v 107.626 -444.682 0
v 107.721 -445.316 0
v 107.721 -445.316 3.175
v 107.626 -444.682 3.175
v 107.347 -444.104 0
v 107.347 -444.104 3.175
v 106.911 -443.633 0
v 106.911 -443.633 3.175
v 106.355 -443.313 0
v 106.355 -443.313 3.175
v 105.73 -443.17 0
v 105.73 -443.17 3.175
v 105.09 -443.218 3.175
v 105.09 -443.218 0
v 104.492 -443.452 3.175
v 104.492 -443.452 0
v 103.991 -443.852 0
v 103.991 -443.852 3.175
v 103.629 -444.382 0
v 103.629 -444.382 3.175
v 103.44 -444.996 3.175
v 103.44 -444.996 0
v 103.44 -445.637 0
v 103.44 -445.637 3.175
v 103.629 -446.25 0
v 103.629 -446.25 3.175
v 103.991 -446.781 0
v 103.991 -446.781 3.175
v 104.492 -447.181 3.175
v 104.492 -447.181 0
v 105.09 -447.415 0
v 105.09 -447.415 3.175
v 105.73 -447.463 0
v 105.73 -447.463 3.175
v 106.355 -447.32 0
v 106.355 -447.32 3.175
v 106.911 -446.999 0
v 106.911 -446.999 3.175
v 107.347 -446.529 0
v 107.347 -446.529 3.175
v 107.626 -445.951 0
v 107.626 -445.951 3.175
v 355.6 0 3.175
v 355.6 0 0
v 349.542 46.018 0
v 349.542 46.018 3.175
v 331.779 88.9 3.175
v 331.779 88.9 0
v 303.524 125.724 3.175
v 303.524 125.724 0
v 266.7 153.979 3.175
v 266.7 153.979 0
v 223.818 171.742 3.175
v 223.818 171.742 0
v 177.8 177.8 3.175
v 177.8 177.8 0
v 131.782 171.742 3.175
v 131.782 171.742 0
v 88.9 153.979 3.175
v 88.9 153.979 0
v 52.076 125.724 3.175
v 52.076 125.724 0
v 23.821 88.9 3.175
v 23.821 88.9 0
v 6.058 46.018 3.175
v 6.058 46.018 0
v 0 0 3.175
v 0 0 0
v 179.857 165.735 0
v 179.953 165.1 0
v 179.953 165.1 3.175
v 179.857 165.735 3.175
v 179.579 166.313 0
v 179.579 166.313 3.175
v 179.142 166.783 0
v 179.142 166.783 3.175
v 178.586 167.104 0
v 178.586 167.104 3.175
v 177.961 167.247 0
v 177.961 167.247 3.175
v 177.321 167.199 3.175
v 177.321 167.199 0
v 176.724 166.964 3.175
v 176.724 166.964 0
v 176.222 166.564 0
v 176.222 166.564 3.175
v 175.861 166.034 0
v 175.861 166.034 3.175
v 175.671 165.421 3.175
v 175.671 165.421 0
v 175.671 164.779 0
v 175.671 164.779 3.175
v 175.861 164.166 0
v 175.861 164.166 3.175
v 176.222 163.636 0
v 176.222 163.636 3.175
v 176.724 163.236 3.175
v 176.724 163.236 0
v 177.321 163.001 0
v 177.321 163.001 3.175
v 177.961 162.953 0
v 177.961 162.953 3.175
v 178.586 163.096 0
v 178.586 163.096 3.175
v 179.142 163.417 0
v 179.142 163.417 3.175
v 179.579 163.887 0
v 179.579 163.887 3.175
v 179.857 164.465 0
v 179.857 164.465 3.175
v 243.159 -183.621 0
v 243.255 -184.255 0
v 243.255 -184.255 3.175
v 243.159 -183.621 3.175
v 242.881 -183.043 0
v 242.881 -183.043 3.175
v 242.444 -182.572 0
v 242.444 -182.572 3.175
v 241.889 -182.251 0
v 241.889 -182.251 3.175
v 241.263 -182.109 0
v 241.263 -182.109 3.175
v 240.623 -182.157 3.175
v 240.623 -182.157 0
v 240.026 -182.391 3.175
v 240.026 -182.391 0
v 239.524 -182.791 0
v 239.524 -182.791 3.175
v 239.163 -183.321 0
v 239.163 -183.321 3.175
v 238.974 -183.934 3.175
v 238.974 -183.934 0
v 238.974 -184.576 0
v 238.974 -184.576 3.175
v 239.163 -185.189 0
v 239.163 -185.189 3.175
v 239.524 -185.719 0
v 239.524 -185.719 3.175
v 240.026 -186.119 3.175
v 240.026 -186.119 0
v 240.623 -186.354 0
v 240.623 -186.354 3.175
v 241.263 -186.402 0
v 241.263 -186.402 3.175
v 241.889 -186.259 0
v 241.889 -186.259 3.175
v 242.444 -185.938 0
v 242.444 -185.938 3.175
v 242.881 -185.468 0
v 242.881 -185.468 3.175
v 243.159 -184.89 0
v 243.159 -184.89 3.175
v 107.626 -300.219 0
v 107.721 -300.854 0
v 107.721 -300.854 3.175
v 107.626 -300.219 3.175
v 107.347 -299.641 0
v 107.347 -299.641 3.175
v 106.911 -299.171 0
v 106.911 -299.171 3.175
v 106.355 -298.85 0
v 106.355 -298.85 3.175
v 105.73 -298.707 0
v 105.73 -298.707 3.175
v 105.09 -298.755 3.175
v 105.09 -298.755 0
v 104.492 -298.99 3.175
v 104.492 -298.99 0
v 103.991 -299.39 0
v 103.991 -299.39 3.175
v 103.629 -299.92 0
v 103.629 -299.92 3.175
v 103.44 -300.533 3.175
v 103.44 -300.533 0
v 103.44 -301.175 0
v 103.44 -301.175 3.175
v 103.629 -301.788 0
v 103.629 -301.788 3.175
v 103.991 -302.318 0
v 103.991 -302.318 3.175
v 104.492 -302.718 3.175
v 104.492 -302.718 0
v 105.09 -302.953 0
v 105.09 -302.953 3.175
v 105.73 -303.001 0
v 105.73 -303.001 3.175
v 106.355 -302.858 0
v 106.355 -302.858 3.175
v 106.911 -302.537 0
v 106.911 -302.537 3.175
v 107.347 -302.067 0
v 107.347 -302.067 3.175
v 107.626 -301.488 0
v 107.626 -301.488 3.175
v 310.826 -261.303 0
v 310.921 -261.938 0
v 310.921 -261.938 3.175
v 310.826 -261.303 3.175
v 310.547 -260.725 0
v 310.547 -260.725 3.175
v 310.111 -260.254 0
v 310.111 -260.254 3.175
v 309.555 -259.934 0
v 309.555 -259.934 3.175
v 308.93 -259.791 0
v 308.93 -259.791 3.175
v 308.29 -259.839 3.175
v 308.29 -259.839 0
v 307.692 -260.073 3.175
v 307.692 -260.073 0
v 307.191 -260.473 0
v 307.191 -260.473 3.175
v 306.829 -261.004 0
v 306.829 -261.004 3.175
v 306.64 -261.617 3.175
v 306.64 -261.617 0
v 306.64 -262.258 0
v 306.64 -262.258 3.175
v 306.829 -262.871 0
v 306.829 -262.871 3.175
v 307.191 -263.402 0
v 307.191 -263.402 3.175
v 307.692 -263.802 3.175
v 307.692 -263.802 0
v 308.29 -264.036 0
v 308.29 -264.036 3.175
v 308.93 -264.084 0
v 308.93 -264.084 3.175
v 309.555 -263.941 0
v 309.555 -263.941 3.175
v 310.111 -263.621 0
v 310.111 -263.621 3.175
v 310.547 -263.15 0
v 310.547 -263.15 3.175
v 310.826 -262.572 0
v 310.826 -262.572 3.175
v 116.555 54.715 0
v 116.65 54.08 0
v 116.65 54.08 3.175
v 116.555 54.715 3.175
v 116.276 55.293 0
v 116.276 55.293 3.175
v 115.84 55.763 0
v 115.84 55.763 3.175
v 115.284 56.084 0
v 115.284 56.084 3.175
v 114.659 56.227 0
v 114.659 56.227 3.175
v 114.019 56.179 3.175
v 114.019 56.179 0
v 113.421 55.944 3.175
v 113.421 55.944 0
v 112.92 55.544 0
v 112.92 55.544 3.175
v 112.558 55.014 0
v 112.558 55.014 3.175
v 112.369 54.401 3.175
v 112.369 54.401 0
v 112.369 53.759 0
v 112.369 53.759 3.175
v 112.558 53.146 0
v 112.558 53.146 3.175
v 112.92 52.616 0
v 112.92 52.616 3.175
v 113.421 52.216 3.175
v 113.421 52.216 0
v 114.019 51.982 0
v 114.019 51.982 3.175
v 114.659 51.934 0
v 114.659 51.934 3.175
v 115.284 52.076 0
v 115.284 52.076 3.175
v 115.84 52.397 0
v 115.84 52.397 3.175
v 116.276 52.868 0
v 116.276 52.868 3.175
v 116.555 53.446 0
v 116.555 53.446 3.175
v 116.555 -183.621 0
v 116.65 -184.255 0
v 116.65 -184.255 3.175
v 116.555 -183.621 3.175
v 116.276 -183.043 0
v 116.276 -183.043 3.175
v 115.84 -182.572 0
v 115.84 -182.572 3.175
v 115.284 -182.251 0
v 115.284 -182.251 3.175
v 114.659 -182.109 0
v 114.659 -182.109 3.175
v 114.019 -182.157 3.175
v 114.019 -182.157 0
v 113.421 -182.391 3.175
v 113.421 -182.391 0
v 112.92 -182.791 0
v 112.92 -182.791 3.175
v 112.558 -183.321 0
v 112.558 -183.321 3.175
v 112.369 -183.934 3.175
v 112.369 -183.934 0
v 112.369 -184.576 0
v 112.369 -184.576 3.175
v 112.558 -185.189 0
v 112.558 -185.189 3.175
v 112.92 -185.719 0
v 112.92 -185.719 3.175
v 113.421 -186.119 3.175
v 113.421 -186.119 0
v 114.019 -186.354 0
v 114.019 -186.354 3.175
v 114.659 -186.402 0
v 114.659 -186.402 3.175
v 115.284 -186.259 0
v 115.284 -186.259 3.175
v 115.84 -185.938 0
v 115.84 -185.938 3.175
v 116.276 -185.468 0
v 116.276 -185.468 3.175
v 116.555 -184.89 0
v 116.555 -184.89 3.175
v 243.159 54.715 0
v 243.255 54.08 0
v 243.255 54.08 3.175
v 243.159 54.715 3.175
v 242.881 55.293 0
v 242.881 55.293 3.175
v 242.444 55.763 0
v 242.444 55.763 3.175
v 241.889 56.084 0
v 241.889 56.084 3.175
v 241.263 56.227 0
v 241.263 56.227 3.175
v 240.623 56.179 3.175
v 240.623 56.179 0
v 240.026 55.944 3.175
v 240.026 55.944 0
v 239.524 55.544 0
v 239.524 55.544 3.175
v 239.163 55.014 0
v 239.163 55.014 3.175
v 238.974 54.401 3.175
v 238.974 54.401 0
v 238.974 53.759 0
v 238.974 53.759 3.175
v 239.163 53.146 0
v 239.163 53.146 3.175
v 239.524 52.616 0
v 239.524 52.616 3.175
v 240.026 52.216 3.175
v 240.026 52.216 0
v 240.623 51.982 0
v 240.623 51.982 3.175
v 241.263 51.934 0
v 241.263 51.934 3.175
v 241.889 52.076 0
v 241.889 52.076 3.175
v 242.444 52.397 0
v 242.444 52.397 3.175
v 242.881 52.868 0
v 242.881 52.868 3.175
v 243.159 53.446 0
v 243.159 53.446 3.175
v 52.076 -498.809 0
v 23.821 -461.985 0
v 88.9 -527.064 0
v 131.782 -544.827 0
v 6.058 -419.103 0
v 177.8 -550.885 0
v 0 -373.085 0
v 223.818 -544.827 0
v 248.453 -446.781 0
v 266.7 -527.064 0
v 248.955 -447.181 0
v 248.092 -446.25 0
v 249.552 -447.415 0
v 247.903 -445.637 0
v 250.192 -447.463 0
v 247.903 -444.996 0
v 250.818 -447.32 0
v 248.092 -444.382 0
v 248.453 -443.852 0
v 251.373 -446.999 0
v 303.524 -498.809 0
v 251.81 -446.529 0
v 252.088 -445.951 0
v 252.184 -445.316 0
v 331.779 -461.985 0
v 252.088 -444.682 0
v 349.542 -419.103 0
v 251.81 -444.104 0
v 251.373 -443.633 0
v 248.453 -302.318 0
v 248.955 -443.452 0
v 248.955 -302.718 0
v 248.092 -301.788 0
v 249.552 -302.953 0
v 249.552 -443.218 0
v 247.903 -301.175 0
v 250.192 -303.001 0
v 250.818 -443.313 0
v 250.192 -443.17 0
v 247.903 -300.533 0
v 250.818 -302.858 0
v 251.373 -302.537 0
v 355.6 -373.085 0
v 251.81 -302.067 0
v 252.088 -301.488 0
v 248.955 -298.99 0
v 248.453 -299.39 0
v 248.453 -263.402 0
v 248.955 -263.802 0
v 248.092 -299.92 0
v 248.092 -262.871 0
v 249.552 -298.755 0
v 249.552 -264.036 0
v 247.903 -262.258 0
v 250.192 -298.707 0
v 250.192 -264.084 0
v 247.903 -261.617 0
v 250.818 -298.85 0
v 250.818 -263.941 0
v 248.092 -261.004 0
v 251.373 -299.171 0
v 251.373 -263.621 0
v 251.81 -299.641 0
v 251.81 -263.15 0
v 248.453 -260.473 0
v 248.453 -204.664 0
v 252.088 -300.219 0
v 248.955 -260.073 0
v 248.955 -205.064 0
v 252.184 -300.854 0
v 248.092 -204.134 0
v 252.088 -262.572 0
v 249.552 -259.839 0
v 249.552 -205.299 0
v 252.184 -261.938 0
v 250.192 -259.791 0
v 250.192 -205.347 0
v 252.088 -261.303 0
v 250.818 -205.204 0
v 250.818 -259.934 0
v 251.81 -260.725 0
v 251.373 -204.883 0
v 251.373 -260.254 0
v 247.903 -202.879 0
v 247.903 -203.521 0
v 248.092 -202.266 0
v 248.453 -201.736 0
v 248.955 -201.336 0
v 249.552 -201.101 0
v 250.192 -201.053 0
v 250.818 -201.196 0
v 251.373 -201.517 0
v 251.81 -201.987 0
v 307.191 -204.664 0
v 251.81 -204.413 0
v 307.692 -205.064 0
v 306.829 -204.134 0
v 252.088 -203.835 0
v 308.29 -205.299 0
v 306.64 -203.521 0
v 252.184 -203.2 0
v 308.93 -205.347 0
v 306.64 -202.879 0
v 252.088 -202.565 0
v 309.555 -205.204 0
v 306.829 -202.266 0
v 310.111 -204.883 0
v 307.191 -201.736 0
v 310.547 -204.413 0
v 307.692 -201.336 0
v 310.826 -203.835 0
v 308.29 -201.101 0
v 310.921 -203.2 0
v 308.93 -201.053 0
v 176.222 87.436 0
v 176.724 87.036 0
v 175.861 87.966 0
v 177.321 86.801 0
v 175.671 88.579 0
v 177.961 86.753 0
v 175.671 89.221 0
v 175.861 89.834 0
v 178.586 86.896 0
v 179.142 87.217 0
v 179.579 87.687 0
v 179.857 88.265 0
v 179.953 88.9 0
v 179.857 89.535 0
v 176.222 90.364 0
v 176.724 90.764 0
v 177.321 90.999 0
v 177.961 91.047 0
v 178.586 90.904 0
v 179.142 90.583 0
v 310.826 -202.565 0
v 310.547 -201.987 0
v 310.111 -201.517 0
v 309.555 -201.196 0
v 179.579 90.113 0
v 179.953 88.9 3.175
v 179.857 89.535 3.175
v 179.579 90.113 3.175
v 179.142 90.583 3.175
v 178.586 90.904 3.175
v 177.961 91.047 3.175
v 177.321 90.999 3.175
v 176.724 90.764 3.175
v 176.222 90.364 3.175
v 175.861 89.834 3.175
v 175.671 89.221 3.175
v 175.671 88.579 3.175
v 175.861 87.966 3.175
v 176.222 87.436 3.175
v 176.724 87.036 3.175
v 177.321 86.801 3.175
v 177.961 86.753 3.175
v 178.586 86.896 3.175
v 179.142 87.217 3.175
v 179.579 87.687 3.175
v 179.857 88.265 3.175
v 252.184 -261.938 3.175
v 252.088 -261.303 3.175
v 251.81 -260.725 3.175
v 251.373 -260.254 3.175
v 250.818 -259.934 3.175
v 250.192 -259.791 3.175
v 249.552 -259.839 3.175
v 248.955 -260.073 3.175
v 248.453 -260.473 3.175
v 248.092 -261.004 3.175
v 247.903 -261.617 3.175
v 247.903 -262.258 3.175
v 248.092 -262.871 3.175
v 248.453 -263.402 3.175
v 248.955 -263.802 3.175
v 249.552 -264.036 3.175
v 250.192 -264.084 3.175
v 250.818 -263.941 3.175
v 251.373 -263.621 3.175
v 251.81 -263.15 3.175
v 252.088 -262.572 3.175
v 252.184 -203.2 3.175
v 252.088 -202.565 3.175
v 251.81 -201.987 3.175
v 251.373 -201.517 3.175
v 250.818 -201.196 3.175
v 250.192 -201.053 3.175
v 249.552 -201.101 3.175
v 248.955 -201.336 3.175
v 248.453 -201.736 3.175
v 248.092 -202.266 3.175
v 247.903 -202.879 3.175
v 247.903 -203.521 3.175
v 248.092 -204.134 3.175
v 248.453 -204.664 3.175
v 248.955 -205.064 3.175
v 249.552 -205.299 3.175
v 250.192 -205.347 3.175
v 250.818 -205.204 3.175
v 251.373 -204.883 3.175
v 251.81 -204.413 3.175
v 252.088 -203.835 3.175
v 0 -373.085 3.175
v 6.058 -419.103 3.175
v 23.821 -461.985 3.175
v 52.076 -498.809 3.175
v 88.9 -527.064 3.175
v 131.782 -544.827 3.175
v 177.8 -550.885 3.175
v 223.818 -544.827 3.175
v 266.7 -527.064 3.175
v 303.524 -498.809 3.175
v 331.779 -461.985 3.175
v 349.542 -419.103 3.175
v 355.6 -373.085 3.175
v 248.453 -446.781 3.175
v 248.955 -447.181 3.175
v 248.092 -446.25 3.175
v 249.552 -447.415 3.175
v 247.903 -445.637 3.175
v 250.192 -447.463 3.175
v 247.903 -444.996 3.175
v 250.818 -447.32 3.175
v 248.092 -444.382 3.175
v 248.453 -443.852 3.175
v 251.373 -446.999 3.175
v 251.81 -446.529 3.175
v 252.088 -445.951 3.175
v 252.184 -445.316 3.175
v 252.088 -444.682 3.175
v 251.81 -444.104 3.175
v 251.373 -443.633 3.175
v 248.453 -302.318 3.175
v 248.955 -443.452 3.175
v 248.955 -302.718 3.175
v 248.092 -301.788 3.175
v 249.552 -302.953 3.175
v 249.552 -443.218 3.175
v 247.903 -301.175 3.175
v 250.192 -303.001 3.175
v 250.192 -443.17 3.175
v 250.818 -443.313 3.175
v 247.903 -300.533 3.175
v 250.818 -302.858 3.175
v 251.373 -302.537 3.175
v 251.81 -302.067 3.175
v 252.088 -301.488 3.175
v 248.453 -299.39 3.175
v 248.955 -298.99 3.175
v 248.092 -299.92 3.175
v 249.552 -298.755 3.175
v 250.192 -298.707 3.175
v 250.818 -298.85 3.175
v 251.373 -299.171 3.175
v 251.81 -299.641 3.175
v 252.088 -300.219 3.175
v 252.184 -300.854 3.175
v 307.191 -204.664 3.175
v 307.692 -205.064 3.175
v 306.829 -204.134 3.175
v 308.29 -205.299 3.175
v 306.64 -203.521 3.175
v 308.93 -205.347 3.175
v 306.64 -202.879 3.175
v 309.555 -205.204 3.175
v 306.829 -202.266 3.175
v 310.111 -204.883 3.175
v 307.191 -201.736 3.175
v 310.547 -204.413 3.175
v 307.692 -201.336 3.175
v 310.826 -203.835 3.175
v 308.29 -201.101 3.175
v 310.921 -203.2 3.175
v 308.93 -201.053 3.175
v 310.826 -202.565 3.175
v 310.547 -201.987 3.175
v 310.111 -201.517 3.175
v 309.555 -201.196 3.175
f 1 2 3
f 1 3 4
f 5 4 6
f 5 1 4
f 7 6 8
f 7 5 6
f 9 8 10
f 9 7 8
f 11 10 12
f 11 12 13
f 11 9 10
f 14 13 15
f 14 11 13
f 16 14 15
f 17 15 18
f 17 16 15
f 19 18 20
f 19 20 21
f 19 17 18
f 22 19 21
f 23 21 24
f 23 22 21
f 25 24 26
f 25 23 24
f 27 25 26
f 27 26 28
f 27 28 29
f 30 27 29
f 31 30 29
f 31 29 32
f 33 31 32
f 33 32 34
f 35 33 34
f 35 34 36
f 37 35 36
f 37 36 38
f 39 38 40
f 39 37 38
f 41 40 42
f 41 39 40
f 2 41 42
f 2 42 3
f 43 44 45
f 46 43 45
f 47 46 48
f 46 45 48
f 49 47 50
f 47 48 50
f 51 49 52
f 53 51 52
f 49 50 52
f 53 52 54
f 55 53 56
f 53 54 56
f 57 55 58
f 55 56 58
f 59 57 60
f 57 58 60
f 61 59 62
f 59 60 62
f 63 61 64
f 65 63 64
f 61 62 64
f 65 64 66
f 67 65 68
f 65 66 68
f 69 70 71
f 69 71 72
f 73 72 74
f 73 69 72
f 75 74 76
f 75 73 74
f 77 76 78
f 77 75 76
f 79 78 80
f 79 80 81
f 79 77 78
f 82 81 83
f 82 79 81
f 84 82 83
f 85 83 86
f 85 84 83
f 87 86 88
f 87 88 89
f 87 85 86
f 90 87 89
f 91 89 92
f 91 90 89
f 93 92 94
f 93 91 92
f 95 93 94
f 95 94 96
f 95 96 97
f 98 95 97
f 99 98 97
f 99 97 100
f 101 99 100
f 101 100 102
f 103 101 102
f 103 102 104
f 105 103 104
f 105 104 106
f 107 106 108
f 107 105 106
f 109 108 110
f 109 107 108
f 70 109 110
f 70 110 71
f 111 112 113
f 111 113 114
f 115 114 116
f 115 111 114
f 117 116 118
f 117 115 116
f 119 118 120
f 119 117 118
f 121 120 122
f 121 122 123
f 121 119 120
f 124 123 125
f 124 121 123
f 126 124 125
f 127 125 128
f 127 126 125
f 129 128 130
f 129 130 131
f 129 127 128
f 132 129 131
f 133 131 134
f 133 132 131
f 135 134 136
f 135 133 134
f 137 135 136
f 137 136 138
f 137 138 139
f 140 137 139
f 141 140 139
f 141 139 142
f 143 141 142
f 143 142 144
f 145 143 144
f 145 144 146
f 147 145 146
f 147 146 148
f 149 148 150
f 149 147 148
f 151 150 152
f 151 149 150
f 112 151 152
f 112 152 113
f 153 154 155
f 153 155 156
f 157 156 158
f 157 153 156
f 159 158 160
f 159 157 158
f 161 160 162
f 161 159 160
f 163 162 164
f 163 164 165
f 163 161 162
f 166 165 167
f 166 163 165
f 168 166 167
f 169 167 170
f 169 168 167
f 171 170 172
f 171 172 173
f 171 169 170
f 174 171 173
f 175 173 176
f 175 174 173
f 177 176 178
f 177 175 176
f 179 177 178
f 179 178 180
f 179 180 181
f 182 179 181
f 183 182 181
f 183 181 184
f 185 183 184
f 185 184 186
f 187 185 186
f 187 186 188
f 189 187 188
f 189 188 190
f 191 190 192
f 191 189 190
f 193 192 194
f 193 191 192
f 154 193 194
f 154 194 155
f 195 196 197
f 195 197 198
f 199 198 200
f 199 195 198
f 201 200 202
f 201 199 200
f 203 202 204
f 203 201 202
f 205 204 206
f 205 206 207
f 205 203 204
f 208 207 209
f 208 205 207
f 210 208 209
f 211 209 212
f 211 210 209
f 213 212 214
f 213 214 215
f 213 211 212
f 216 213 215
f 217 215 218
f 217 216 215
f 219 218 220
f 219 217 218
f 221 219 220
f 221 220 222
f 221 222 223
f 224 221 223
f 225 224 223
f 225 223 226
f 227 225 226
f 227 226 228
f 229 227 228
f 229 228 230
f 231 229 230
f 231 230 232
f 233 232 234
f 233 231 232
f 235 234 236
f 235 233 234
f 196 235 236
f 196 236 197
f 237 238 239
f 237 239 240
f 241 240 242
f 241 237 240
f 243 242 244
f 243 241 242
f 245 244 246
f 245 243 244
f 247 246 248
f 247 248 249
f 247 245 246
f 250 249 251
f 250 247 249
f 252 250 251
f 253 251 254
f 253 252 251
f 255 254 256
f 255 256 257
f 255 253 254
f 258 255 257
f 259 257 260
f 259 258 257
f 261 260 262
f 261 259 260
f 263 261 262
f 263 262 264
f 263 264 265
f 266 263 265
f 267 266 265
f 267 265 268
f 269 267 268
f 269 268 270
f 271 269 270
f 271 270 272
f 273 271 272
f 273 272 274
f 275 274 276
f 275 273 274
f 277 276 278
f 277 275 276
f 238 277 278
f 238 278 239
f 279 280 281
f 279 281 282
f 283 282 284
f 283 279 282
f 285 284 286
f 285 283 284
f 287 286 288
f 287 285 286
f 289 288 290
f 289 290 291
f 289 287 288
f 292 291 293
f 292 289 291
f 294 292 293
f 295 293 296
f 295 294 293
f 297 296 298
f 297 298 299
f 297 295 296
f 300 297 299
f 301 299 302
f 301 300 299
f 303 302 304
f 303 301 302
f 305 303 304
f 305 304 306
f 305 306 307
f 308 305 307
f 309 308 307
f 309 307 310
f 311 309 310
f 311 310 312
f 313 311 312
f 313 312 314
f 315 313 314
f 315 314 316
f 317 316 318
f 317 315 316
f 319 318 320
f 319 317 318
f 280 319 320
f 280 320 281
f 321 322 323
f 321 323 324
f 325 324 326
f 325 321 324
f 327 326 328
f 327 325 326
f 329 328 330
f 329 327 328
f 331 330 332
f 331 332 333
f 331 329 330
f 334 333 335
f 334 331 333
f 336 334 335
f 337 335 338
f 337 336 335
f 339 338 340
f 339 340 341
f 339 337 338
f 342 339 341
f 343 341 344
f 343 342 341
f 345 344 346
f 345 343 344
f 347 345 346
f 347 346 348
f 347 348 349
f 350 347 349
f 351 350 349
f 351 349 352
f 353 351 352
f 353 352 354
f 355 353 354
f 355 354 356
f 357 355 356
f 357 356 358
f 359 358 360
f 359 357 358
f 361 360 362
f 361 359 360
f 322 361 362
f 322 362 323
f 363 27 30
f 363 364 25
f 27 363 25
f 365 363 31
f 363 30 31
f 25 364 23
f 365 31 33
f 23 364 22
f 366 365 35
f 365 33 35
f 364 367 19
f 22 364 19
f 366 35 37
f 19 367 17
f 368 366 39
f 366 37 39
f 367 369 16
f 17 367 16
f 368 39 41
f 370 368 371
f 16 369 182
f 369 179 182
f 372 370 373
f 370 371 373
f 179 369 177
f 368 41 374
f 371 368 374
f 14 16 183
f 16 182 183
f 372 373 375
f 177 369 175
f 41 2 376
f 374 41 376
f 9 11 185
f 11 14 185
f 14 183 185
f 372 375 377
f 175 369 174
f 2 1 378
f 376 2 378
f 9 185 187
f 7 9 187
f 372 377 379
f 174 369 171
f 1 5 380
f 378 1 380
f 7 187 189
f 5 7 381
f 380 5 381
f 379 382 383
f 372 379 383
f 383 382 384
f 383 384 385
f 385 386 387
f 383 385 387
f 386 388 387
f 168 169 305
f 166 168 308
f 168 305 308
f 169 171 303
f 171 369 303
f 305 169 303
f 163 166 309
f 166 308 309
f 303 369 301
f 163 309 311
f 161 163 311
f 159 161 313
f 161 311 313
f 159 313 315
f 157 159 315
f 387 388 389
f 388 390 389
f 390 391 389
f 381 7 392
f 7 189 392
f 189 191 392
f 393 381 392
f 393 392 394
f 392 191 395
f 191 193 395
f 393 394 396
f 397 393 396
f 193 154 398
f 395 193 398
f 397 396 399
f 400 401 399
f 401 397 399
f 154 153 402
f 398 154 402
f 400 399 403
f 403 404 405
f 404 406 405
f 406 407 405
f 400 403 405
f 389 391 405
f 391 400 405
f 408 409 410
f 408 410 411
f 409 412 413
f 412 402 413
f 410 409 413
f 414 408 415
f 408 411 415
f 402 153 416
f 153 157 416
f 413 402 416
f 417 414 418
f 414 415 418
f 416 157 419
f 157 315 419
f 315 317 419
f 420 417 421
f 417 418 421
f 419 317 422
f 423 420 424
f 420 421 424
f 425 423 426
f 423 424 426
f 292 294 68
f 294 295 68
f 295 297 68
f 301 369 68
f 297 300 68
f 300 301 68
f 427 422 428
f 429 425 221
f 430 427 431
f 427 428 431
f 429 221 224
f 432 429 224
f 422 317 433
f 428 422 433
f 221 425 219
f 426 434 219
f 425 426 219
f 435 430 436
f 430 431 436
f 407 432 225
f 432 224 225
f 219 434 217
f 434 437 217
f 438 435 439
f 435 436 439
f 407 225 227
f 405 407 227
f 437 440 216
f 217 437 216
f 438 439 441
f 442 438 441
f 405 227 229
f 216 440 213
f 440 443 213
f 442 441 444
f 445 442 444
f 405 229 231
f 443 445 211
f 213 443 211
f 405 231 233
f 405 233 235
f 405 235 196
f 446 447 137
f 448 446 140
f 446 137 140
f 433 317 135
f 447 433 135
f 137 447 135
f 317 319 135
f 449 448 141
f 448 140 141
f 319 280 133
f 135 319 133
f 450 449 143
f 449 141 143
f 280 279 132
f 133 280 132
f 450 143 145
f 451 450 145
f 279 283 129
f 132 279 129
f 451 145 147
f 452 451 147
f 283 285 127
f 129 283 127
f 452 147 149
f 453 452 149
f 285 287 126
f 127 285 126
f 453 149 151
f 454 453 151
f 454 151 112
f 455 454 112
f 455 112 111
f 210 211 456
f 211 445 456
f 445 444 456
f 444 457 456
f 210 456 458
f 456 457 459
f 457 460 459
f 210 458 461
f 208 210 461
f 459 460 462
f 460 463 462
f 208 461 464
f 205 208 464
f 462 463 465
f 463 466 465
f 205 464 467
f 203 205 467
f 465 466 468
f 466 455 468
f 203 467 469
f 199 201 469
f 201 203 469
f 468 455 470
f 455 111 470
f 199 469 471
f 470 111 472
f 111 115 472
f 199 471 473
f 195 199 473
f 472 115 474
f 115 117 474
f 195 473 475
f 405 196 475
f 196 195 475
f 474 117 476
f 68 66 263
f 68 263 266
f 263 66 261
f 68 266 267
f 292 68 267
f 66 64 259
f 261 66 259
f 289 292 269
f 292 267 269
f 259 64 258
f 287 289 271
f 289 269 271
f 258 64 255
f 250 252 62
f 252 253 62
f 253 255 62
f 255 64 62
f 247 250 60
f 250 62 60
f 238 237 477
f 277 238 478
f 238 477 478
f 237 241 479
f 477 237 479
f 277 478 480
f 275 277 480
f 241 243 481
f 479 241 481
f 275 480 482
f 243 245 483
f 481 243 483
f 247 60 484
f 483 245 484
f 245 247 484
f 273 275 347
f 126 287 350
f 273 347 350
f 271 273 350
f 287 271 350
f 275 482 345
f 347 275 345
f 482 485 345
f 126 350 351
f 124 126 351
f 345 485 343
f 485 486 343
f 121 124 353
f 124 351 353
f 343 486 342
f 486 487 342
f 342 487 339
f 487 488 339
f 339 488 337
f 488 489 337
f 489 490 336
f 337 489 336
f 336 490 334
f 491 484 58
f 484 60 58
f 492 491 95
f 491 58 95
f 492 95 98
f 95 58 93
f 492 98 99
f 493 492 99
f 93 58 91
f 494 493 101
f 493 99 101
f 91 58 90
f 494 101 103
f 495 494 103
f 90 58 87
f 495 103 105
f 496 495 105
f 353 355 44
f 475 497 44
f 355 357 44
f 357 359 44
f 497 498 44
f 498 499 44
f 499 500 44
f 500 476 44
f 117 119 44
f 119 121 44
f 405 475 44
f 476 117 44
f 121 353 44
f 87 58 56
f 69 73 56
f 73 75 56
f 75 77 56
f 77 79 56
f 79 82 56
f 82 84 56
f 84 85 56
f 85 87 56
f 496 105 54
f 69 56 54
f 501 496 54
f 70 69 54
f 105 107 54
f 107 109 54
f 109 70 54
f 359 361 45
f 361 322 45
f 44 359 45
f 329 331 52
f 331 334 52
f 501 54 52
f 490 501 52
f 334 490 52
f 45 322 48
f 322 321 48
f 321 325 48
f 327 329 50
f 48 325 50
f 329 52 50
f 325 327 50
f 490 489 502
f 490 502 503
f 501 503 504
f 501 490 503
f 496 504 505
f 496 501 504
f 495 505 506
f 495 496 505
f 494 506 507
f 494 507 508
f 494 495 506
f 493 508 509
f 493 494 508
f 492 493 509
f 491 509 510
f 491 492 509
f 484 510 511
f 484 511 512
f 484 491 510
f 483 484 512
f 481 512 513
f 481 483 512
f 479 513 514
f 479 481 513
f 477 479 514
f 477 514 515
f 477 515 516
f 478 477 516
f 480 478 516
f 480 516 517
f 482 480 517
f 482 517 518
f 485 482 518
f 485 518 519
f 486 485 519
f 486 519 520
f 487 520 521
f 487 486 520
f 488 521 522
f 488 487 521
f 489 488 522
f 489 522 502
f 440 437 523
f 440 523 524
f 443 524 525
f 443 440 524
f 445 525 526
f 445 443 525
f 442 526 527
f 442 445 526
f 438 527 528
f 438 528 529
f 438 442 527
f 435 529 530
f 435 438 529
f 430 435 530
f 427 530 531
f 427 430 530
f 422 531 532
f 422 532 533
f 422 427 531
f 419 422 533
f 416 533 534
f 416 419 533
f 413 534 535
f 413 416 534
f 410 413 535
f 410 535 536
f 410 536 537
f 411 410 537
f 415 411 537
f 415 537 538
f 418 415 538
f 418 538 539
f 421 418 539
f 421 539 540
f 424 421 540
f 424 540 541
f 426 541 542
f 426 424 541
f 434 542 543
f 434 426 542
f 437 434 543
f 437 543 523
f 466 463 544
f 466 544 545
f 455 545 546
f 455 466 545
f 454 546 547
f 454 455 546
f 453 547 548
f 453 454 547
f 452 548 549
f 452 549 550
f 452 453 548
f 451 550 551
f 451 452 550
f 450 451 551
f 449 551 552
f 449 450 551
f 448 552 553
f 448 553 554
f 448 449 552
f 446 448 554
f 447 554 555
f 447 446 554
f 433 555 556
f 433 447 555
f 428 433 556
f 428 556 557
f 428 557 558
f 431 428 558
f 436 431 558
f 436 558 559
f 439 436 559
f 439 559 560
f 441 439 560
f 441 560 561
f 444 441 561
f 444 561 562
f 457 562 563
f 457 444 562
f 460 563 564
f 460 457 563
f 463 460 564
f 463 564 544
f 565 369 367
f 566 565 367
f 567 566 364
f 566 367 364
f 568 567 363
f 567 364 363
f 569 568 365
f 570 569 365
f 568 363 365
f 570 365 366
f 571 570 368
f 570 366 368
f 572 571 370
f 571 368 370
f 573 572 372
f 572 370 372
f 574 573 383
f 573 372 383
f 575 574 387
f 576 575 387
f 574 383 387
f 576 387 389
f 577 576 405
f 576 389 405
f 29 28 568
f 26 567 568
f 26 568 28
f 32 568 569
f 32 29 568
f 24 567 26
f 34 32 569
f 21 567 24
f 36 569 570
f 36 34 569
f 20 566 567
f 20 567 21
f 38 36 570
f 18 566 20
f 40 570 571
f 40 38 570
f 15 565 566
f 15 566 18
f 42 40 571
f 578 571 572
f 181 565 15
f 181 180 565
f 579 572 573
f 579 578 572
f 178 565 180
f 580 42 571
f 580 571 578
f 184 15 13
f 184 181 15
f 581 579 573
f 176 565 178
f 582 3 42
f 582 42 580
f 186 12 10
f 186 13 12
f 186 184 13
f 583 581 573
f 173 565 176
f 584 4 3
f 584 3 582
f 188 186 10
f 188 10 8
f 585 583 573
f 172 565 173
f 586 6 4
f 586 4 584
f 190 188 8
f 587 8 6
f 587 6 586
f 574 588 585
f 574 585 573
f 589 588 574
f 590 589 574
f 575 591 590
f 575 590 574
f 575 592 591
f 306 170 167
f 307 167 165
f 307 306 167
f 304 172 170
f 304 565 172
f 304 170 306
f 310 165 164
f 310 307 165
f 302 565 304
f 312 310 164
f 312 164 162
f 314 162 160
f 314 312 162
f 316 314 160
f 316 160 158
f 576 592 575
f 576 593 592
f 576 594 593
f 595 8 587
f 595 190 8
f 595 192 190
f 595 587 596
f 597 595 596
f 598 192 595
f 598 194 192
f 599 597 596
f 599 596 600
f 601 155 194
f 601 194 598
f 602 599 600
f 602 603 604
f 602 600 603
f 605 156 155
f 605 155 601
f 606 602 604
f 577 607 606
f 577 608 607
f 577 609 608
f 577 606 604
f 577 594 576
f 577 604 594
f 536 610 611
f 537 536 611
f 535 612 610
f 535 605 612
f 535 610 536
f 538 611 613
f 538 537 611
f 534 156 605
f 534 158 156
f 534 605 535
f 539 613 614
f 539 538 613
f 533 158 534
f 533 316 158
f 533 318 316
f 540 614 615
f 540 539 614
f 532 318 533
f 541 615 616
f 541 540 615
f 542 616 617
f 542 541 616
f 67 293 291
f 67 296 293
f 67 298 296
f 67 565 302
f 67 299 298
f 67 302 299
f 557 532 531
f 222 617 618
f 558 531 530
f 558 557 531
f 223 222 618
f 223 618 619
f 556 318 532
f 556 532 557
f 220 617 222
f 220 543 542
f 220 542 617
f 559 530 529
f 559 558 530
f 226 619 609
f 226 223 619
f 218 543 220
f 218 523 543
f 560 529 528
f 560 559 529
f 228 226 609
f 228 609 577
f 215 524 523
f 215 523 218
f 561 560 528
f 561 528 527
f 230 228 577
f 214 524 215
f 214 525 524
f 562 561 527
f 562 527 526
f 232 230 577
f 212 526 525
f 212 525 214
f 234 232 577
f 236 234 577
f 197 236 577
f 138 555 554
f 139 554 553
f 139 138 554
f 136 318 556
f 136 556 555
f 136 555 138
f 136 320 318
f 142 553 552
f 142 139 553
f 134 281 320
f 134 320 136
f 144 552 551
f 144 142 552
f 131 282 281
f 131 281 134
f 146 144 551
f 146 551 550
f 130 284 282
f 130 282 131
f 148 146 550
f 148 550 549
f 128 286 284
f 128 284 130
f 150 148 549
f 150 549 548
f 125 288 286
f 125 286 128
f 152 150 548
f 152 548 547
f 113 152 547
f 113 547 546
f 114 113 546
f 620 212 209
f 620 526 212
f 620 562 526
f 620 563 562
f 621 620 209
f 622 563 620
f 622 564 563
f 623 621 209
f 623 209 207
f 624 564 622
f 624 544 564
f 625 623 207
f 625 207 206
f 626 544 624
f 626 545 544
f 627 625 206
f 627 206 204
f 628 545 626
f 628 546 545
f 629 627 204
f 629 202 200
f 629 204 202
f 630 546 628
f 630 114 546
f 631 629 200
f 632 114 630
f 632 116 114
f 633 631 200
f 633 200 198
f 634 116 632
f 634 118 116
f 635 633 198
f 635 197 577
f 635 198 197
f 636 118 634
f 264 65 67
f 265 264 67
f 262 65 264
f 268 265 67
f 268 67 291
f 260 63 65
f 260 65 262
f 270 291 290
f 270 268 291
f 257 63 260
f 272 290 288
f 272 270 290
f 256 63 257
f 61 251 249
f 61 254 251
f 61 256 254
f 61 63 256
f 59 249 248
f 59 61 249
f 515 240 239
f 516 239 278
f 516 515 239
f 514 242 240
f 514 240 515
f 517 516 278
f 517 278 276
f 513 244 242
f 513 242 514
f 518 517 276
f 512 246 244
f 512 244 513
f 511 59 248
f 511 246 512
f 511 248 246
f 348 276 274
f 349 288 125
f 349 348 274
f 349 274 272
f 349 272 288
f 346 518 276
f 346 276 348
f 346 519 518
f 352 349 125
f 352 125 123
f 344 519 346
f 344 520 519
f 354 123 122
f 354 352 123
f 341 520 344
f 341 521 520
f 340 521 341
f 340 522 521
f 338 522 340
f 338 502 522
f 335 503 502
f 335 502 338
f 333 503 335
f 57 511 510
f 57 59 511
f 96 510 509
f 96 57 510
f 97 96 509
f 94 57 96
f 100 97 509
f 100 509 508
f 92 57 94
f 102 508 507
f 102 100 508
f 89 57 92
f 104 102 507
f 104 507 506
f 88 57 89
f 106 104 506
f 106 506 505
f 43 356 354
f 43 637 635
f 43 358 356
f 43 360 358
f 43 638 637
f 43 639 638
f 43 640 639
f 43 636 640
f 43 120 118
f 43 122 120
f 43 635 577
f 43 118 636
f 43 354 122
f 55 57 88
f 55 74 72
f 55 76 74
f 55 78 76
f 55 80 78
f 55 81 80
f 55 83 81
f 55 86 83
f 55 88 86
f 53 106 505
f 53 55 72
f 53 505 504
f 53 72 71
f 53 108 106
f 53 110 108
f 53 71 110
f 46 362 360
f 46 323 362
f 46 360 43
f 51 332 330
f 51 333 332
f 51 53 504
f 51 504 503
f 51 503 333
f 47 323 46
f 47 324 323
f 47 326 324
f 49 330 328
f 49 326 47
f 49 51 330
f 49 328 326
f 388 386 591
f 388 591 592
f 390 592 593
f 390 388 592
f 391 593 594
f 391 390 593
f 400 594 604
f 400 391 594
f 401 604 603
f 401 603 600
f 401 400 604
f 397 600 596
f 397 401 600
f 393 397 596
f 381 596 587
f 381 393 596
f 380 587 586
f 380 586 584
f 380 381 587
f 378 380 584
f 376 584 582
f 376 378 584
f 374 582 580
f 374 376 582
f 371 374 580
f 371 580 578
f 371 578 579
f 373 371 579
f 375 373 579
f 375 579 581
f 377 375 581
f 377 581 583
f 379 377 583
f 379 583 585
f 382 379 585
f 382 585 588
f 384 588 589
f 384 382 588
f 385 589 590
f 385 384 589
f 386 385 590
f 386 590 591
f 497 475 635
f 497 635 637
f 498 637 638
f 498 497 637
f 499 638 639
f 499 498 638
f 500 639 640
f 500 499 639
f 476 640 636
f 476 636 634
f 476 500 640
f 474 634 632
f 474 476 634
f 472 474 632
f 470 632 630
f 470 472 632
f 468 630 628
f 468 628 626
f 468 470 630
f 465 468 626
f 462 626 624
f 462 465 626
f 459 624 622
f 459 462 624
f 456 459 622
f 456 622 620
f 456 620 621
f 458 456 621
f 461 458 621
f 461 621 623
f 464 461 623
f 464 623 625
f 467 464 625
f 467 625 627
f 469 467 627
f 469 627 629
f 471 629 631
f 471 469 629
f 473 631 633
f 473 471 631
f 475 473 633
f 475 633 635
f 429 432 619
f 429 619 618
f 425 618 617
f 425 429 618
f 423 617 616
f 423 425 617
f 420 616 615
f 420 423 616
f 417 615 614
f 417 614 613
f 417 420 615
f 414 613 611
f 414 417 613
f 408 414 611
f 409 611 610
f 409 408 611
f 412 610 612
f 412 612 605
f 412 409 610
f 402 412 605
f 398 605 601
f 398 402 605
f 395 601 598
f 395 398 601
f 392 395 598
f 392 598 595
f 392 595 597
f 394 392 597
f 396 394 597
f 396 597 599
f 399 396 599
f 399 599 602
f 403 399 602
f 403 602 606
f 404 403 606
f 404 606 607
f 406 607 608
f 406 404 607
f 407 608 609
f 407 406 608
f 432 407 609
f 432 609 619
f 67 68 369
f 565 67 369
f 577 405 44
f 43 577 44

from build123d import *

# Parameters (mm, degrees)
F0_R     = 2.15265
F1_DEPTH = 3.175


with BuildPart() as f1:
    # F0 (on Top) → F1 (new body)
    with BuildSketch(Plane.XY):
        with BuildLine():
            ThreePointArc((355.6, 0), (177.8, 177.8), (0, 0))
            Line((0, 0), (0, -373.085176))
            ThreePointArc((0, -373.085176), (177.8, -550.885176), (355.6, -373.085176))
            Line((355.6, -373.085176), (355.6, 0))
        make_face()
        with Locations((105.56875, -445.316426)):
            Circle(F0_R, mode=Mode.SUBTRACT)
        with Locations((105.56875, -300.853926)):
            Circle(F0_R, mode=Mode.SUBTRACT)
        with Locations((250.03125, -445.316426)):
            Circle(F0_R, mode=Mode.SUBTRACT)
        with Locations((250.03125, -300.853926)):
            Circle(F0_R, mode=Mode.SUBTRACT)
        with Locations((250.03125, -261.9375)):
            Circle(F0_R, mode=Mode.SUBTRACT)
        with Locations((250.03125, -203.2)):
            Circle(F0_R, mode=Mode.SUBTRACT)
        with Locations((308.76875, -261.9375)):
            Circle(F0_R, mode=Mode.SUBTRACT)
        with Locations((308.76875, -203.2)):
            Circle(F0_R, mode=Mode.SUBTRACT)
        with Locations((114.497731, -184.255246)):
            Circle(F0_R, mode=Mode.SUBTRACT)
        with Locations((114.497731, 54.080246)):
            Circle(F0_R, mode=Mode.SUBTRACT)
        with Locations((241.102269, -184.255246)):
            Circle(F0_R, mode=Mode.SUBTRACT)
        with Locations((241.102269, 54.080246)):
            Circle(F0_R, mode=Mode.SUBTRACT)
        with Locations((177.8, 88.9)):
            Circle(F0_R, mode=Mode.SUBTRACT)
        with Locations((177.8, 165.1)):
            Circle(F0_R, mode=Mode.SUBTRACT)
    extrude(amount=F1_DEPTH)


solid = f1.part
